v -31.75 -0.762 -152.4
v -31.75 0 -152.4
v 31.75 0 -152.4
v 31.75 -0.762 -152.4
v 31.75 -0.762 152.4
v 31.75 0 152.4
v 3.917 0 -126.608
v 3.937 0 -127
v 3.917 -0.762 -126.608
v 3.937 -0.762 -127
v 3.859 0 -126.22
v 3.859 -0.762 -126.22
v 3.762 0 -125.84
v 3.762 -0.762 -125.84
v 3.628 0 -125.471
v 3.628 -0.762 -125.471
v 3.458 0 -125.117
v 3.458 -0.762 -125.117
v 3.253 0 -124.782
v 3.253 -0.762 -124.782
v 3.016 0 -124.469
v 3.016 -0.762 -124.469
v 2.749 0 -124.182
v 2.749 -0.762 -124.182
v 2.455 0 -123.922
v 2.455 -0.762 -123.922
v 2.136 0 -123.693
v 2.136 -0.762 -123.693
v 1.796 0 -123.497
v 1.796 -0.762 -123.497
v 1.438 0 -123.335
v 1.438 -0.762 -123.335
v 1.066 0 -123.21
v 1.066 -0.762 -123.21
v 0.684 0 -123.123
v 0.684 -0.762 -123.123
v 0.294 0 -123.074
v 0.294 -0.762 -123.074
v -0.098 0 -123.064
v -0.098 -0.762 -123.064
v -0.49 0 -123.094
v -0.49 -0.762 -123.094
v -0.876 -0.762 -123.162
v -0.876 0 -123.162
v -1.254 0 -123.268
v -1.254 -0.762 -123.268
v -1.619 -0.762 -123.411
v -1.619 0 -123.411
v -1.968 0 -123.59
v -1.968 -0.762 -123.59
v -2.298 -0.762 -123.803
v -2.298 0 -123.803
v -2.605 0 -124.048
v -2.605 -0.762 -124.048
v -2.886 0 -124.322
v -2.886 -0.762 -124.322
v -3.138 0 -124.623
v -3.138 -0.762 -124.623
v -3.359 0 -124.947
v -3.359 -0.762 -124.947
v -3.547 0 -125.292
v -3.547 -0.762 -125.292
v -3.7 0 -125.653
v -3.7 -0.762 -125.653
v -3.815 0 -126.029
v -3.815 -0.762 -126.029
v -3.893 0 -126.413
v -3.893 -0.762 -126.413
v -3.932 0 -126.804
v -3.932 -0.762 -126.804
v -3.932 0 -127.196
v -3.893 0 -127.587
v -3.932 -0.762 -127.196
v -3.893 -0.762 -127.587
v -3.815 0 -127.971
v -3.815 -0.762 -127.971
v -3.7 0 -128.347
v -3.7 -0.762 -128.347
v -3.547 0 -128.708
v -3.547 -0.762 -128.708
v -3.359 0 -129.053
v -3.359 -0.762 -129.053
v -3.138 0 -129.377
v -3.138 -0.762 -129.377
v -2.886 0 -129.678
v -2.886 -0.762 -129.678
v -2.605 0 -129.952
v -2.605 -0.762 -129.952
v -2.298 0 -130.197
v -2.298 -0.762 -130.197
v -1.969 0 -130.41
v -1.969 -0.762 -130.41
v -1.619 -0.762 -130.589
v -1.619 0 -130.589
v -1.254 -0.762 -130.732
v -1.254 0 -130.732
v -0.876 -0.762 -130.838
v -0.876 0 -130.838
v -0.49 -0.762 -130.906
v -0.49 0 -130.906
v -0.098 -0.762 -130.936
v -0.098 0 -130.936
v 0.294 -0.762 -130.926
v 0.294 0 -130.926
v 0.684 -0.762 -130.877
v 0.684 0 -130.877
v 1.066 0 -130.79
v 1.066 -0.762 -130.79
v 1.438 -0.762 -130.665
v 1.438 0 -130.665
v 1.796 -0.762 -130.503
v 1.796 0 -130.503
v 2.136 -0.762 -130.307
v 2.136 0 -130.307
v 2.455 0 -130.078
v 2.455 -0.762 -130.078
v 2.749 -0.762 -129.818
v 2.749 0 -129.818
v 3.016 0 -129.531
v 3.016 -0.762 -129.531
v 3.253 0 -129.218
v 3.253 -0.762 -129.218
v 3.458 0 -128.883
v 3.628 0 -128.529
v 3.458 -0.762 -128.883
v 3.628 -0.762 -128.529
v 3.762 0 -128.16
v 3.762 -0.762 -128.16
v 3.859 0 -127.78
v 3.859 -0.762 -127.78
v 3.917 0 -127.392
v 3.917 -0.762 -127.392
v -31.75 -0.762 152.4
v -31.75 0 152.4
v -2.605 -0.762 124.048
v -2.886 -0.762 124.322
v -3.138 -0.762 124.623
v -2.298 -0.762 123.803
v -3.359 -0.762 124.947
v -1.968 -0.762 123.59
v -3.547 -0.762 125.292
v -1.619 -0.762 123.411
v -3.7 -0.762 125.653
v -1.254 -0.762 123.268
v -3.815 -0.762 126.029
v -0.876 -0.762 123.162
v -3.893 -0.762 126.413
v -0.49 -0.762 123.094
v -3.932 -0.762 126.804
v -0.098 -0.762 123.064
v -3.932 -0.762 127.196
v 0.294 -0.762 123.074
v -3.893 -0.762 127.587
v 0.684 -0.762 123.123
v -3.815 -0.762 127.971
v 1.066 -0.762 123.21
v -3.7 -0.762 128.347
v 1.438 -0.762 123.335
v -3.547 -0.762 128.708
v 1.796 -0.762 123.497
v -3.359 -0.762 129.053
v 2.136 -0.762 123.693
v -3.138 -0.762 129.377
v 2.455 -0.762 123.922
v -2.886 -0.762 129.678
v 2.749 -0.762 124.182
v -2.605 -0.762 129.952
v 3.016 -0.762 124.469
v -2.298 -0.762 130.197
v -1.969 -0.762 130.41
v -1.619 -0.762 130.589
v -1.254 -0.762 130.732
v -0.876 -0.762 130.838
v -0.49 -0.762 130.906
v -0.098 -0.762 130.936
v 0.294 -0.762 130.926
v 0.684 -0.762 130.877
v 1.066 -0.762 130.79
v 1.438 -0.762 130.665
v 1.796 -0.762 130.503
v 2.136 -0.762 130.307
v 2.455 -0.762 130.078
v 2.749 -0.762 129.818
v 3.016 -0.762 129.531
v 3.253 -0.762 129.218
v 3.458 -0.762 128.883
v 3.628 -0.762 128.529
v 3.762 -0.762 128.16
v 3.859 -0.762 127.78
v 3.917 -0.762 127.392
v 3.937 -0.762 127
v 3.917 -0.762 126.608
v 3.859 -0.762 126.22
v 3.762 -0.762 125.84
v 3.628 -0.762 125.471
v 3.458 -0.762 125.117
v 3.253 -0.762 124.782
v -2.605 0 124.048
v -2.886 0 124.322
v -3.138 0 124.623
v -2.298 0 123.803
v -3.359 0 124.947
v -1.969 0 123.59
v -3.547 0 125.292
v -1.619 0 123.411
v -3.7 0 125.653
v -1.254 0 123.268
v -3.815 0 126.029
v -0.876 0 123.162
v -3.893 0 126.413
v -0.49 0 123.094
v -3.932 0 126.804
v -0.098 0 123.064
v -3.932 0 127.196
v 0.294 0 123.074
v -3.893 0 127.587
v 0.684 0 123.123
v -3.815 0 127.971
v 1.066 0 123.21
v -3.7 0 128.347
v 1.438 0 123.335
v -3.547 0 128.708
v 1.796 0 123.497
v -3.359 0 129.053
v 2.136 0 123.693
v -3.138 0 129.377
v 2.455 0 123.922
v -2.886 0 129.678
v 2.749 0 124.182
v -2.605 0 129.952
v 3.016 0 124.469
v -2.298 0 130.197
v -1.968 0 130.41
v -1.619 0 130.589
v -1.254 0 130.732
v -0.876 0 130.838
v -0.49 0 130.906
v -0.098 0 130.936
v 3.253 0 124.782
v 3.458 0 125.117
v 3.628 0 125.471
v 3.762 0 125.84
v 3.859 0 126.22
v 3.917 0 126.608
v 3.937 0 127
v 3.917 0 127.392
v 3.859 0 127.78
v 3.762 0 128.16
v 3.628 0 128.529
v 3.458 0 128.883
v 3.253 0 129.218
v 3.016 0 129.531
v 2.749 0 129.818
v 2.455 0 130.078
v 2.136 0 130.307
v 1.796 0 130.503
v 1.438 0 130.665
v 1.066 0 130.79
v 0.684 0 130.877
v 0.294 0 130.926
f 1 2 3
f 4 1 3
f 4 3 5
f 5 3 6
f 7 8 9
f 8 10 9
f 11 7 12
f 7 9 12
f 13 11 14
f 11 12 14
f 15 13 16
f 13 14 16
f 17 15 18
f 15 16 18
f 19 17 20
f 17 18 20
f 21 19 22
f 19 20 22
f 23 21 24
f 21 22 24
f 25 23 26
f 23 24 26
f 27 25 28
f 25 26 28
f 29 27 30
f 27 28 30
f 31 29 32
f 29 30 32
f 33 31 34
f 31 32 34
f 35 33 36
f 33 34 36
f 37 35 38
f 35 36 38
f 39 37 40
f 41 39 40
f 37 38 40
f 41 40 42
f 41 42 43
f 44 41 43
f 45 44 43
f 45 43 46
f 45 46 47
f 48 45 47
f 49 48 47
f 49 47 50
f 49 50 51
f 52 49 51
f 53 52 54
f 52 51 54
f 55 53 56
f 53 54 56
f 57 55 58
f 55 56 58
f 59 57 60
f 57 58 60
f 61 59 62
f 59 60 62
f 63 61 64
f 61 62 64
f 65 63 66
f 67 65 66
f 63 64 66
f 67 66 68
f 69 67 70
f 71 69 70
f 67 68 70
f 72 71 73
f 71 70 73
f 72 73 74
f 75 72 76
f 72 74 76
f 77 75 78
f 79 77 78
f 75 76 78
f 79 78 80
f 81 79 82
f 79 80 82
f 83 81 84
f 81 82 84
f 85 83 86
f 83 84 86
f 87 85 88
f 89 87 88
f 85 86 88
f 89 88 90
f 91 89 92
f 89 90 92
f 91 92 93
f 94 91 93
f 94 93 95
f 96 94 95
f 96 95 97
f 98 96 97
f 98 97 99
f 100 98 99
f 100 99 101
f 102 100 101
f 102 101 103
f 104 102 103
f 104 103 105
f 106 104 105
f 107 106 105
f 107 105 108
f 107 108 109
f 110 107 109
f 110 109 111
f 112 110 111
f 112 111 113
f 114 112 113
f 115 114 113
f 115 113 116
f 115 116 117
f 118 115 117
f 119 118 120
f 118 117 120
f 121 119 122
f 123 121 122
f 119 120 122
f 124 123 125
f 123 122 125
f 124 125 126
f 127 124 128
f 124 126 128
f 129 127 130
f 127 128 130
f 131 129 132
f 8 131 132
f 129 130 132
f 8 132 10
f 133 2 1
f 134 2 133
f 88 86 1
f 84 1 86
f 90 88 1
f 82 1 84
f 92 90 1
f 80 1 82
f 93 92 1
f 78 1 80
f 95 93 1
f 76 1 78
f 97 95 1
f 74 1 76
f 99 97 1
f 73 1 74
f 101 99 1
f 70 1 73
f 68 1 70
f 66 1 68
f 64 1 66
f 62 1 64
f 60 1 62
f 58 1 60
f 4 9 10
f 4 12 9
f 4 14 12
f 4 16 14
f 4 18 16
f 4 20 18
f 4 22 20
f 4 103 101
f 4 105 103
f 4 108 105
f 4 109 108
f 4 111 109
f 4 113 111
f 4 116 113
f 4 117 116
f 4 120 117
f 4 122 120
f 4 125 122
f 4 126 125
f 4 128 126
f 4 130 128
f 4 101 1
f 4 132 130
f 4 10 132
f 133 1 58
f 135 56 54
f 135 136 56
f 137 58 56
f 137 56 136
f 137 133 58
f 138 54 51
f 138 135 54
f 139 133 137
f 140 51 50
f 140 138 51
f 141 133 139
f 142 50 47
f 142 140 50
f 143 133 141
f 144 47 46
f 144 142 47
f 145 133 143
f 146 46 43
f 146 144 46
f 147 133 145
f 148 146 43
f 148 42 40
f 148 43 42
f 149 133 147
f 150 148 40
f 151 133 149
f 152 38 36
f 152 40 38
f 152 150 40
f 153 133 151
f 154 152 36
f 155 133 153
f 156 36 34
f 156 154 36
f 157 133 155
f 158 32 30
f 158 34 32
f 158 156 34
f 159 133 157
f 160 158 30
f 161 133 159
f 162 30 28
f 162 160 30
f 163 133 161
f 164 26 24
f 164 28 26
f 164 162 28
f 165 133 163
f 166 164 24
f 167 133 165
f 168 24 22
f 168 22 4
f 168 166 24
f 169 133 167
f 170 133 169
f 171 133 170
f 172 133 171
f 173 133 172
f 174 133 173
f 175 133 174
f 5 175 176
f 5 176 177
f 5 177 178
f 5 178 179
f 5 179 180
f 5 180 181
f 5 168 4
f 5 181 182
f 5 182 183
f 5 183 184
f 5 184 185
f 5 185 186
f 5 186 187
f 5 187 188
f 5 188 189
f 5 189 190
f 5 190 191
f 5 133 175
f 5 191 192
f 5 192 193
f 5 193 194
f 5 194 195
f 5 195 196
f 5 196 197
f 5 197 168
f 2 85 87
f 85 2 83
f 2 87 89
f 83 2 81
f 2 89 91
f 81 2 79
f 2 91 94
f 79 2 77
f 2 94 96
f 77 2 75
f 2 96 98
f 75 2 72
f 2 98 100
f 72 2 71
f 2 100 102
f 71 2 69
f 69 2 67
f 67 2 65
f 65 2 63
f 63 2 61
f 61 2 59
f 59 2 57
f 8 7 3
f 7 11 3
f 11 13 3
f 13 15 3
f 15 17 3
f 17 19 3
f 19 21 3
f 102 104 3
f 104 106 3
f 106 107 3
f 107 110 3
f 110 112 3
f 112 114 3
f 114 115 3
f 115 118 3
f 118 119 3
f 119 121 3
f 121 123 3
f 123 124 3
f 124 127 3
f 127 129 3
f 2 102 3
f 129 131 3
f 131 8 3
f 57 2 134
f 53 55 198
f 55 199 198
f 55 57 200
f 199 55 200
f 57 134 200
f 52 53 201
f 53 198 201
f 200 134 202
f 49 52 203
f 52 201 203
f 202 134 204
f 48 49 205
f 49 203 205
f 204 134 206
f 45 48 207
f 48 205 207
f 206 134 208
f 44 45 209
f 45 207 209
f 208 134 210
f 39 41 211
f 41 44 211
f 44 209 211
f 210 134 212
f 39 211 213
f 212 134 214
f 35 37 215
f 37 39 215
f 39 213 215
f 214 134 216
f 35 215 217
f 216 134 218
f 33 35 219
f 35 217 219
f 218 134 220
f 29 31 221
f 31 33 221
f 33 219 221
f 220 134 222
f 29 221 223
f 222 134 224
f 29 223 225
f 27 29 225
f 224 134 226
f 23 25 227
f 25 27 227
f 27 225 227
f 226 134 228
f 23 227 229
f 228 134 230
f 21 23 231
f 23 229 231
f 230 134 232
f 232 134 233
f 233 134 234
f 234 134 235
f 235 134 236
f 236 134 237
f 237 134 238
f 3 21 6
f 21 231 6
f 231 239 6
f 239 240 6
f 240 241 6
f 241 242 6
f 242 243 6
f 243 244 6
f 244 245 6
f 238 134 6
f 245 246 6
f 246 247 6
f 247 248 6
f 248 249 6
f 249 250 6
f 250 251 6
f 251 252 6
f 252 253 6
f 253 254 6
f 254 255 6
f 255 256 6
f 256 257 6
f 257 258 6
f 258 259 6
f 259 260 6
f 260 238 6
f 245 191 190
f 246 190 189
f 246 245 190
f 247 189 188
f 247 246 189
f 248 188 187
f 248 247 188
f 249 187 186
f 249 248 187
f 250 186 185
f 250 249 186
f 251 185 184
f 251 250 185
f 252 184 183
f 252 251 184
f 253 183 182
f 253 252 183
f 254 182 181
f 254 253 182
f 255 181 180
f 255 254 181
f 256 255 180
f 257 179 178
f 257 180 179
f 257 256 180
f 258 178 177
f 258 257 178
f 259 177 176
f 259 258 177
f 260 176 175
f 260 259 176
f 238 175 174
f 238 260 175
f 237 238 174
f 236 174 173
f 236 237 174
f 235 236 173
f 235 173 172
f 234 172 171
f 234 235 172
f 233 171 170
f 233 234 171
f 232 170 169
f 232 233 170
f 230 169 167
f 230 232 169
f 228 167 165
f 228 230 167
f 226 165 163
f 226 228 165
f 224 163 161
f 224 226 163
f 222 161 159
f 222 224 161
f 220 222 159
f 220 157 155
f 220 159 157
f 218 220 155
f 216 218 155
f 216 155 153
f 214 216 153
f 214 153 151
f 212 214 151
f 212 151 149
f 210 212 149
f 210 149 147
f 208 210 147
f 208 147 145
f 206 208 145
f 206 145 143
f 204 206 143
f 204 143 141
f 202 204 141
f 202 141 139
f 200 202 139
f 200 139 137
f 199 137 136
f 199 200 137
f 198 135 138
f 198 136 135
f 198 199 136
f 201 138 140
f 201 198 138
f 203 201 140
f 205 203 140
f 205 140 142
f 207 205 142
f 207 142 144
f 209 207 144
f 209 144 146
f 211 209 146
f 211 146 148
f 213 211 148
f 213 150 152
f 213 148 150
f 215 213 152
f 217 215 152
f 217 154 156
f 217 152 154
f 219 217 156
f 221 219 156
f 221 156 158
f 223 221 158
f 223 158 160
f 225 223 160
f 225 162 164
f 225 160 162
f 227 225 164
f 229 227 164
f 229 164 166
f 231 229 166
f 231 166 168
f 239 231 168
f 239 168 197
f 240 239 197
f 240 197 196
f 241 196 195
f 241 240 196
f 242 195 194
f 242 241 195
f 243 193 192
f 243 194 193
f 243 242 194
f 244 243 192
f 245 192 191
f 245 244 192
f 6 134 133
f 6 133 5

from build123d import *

# Parameters (mm, degrees)
F0_W     = 63.5
F0_H     = 304.8
F1_DEPTH = 0.762
F2_R     = 3.937
F3_DEPTH = 12.7


with BuildPart() as f1:
    # F0 (on Front) → F1 (new body)
    with BuildSketch(Plane.XZ):
        Rectangle(F0_W, F0_H)
    extrude(amount=F1_DEPTH)

    # F2 (on Front) → F3 (cut, symmetric)
    with BuildSketch(Plane.XZ):
        with Locations((0, 127)):
            Circle(F2_R)
        with Locations((0, -127)):
            Circle(F2_R)
    extrude(amount=F3_DEPTH, both=True, mode=Mode.SUBTRACT)


solid = f1.part
